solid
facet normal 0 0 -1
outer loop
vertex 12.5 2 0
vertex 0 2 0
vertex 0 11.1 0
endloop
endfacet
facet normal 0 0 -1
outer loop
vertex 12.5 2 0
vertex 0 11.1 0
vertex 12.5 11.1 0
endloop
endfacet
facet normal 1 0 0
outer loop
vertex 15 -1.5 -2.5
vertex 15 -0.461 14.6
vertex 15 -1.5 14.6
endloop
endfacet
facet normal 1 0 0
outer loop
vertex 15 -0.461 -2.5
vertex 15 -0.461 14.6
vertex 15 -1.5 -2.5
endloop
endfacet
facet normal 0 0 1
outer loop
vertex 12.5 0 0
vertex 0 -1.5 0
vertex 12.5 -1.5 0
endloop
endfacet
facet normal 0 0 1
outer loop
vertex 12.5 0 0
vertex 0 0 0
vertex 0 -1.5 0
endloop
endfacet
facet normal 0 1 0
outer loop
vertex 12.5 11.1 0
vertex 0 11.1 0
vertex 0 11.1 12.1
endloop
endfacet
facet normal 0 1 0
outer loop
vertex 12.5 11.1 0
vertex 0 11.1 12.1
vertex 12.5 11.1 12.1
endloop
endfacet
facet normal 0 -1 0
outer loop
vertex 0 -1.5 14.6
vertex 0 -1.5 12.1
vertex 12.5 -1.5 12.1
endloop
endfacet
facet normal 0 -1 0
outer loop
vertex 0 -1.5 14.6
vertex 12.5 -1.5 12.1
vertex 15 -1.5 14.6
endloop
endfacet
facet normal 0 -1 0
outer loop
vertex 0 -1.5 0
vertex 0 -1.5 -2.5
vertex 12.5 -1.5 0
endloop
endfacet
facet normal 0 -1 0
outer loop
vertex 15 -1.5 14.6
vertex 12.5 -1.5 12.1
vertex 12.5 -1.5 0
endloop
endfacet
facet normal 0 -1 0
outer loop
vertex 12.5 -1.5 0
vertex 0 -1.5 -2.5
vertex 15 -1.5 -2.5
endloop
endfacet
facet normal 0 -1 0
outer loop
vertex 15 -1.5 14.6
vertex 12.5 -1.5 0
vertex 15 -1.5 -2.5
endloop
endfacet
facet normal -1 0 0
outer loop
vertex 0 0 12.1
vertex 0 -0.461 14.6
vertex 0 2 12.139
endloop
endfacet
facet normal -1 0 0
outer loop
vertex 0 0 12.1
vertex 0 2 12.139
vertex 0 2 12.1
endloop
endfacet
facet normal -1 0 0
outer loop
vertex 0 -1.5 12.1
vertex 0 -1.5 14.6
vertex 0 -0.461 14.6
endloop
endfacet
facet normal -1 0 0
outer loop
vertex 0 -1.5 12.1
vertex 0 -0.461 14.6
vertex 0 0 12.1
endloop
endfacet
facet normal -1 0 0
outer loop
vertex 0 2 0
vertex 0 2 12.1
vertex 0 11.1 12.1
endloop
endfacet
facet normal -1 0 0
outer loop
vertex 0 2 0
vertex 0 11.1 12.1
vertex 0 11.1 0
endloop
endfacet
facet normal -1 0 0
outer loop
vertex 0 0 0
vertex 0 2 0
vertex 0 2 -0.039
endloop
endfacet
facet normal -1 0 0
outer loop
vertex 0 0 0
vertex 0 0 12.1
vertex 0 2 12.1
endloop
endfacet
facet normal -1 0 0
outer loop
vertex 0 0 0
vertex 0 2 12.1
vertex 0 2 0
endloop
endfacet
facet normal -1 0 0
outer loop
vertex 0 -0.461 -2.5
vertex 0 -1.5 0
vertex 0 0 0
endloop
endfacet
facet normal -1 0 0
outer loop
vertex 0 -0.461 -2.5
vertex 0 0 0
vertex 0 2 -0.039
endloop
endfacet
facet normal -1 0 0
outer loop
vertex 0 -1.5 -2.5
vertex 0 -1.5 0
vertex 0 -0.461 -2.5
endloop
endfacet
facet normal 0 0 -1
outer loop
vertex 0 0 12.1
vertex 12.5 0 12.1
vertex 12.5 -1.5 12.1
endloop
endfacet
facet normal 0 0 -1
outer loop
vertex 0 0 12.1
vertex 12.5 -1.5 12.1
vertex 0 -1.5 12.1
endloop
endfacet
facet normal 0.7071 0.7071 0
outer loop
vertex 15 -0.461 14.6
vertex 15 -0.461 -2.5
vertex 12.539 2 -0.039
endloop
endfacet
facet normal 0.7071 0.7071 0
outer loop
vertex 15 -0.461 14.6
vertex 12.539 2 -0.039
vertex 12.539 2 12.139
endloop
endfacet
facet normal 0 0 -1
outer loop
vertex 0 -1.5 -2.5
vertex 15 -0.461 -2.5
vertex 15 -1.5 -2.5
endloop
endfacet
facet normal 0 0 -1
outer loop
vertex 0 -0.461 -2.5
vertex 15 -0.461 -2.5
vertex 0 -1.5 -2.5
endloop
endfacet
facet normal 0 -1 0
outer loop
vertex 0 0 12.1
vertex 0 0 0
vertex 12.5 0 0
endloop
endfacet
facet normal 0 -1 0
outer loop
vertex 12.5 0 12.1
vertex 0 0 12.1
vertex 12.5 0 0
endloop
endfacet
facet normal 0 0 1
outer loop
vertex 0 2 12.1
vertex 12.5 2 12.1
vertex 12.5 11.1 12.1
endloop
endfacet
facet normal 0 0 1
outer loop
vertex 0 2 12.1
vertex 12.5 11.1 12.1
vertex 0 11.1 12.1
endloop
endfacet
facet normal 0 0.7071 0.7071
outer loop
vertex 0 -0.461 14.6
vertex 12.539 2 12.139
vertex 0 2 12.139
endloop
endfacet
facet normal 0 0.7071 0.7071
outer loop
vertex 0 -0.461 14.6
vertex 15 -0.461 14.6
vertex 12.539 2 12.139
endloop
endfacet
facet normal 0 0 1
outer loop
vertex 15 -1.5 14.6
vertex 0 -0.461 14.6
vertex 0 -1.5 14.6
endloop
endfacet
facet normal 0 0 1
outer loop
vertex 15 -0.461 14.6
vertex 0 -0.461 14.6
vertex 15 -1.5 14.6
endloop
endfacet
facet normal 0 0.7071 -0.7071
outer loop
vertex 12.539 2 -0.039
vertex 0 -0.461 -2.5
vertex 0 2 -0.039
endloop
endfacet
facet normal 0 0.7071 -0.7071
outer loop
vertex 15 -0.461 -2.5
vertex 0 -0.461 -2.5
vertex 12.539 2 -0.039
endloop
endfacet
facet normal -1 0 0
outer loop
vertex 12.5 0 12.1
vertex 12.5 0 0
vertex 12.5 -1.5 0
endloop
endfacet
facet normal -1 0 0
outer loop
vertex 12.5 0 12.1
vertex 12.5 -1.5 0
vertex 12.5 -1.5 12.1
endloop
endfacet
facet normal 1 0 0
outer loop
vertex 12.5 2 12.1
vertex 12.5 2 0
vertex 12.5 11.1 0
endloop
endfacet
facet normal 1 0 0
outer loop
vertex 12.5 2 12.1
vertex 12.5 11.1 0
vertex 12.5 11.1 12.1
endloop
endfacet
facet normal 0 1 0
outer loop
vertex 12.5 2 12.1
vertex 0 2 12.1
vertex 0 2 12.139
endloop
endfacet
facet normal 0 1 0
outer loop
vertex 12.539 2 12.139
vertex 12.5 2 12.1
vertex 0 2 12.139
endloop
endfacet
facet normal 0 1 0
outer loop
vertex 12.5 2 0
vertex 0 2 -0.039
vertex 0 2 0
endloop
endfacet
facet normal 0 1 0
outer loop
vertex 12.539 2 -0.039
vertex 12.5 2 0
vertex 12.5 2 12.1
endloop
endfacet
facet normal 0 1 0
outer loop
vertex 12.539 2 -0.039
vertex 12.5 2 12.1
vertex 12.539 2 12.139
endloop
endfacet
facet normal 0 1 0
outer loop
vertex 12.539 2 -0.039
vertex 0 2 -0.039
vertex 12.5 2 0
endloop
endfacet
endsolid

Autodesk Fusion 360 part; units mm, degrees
sketch "Sketch1" plane through (0, 0, 0) normal (0, 1, 0) x (1, 0, 0)
  line L0 (0, 0) -> (12.5, 0)
  line L1 (12.5, 0) -> (12.5, -12.1)
  line L2 (12.5, -12.1) -> (0, -12.1)
  line L3 (0, -12.1) -> (0, 0)
  line L4 (0, -12.1) -> (0, -14.6)
  line L5 (0, -14.6) -> (15, -14.6)
  line L6 (15, -14.6) -> (15, 0.0553)
  line L7 (15, 0.0553) -> (15, 2.5)
  line L8 (15, 2.5) -> (0, 2.5)
  line L9 (0, 2.5) -> (0, 0)
  dimension "d1" = 12.1
  dimension "d2" = 12.5
  dimension "d3" = 2.5
  dimension "d4" = 2.5
  dimension "d5" = 2.5
extrude "Extrude1" add sketch "Sketch1" along normal blind 11.1 contours L0 L1 L2 L3
extrude "Extrude3" add sketch "Sketch1" along normal blind -1.5 and the other way blind -2 contours L0 L1 L2 L4 L5 L6 L7 L8 L9
chamfer "Chamfer2" distance 2.461 angle 45 3 edges at (7.5, 2, 14.6) (15, 2, 6.05) (7.5, 2, -2.5)
